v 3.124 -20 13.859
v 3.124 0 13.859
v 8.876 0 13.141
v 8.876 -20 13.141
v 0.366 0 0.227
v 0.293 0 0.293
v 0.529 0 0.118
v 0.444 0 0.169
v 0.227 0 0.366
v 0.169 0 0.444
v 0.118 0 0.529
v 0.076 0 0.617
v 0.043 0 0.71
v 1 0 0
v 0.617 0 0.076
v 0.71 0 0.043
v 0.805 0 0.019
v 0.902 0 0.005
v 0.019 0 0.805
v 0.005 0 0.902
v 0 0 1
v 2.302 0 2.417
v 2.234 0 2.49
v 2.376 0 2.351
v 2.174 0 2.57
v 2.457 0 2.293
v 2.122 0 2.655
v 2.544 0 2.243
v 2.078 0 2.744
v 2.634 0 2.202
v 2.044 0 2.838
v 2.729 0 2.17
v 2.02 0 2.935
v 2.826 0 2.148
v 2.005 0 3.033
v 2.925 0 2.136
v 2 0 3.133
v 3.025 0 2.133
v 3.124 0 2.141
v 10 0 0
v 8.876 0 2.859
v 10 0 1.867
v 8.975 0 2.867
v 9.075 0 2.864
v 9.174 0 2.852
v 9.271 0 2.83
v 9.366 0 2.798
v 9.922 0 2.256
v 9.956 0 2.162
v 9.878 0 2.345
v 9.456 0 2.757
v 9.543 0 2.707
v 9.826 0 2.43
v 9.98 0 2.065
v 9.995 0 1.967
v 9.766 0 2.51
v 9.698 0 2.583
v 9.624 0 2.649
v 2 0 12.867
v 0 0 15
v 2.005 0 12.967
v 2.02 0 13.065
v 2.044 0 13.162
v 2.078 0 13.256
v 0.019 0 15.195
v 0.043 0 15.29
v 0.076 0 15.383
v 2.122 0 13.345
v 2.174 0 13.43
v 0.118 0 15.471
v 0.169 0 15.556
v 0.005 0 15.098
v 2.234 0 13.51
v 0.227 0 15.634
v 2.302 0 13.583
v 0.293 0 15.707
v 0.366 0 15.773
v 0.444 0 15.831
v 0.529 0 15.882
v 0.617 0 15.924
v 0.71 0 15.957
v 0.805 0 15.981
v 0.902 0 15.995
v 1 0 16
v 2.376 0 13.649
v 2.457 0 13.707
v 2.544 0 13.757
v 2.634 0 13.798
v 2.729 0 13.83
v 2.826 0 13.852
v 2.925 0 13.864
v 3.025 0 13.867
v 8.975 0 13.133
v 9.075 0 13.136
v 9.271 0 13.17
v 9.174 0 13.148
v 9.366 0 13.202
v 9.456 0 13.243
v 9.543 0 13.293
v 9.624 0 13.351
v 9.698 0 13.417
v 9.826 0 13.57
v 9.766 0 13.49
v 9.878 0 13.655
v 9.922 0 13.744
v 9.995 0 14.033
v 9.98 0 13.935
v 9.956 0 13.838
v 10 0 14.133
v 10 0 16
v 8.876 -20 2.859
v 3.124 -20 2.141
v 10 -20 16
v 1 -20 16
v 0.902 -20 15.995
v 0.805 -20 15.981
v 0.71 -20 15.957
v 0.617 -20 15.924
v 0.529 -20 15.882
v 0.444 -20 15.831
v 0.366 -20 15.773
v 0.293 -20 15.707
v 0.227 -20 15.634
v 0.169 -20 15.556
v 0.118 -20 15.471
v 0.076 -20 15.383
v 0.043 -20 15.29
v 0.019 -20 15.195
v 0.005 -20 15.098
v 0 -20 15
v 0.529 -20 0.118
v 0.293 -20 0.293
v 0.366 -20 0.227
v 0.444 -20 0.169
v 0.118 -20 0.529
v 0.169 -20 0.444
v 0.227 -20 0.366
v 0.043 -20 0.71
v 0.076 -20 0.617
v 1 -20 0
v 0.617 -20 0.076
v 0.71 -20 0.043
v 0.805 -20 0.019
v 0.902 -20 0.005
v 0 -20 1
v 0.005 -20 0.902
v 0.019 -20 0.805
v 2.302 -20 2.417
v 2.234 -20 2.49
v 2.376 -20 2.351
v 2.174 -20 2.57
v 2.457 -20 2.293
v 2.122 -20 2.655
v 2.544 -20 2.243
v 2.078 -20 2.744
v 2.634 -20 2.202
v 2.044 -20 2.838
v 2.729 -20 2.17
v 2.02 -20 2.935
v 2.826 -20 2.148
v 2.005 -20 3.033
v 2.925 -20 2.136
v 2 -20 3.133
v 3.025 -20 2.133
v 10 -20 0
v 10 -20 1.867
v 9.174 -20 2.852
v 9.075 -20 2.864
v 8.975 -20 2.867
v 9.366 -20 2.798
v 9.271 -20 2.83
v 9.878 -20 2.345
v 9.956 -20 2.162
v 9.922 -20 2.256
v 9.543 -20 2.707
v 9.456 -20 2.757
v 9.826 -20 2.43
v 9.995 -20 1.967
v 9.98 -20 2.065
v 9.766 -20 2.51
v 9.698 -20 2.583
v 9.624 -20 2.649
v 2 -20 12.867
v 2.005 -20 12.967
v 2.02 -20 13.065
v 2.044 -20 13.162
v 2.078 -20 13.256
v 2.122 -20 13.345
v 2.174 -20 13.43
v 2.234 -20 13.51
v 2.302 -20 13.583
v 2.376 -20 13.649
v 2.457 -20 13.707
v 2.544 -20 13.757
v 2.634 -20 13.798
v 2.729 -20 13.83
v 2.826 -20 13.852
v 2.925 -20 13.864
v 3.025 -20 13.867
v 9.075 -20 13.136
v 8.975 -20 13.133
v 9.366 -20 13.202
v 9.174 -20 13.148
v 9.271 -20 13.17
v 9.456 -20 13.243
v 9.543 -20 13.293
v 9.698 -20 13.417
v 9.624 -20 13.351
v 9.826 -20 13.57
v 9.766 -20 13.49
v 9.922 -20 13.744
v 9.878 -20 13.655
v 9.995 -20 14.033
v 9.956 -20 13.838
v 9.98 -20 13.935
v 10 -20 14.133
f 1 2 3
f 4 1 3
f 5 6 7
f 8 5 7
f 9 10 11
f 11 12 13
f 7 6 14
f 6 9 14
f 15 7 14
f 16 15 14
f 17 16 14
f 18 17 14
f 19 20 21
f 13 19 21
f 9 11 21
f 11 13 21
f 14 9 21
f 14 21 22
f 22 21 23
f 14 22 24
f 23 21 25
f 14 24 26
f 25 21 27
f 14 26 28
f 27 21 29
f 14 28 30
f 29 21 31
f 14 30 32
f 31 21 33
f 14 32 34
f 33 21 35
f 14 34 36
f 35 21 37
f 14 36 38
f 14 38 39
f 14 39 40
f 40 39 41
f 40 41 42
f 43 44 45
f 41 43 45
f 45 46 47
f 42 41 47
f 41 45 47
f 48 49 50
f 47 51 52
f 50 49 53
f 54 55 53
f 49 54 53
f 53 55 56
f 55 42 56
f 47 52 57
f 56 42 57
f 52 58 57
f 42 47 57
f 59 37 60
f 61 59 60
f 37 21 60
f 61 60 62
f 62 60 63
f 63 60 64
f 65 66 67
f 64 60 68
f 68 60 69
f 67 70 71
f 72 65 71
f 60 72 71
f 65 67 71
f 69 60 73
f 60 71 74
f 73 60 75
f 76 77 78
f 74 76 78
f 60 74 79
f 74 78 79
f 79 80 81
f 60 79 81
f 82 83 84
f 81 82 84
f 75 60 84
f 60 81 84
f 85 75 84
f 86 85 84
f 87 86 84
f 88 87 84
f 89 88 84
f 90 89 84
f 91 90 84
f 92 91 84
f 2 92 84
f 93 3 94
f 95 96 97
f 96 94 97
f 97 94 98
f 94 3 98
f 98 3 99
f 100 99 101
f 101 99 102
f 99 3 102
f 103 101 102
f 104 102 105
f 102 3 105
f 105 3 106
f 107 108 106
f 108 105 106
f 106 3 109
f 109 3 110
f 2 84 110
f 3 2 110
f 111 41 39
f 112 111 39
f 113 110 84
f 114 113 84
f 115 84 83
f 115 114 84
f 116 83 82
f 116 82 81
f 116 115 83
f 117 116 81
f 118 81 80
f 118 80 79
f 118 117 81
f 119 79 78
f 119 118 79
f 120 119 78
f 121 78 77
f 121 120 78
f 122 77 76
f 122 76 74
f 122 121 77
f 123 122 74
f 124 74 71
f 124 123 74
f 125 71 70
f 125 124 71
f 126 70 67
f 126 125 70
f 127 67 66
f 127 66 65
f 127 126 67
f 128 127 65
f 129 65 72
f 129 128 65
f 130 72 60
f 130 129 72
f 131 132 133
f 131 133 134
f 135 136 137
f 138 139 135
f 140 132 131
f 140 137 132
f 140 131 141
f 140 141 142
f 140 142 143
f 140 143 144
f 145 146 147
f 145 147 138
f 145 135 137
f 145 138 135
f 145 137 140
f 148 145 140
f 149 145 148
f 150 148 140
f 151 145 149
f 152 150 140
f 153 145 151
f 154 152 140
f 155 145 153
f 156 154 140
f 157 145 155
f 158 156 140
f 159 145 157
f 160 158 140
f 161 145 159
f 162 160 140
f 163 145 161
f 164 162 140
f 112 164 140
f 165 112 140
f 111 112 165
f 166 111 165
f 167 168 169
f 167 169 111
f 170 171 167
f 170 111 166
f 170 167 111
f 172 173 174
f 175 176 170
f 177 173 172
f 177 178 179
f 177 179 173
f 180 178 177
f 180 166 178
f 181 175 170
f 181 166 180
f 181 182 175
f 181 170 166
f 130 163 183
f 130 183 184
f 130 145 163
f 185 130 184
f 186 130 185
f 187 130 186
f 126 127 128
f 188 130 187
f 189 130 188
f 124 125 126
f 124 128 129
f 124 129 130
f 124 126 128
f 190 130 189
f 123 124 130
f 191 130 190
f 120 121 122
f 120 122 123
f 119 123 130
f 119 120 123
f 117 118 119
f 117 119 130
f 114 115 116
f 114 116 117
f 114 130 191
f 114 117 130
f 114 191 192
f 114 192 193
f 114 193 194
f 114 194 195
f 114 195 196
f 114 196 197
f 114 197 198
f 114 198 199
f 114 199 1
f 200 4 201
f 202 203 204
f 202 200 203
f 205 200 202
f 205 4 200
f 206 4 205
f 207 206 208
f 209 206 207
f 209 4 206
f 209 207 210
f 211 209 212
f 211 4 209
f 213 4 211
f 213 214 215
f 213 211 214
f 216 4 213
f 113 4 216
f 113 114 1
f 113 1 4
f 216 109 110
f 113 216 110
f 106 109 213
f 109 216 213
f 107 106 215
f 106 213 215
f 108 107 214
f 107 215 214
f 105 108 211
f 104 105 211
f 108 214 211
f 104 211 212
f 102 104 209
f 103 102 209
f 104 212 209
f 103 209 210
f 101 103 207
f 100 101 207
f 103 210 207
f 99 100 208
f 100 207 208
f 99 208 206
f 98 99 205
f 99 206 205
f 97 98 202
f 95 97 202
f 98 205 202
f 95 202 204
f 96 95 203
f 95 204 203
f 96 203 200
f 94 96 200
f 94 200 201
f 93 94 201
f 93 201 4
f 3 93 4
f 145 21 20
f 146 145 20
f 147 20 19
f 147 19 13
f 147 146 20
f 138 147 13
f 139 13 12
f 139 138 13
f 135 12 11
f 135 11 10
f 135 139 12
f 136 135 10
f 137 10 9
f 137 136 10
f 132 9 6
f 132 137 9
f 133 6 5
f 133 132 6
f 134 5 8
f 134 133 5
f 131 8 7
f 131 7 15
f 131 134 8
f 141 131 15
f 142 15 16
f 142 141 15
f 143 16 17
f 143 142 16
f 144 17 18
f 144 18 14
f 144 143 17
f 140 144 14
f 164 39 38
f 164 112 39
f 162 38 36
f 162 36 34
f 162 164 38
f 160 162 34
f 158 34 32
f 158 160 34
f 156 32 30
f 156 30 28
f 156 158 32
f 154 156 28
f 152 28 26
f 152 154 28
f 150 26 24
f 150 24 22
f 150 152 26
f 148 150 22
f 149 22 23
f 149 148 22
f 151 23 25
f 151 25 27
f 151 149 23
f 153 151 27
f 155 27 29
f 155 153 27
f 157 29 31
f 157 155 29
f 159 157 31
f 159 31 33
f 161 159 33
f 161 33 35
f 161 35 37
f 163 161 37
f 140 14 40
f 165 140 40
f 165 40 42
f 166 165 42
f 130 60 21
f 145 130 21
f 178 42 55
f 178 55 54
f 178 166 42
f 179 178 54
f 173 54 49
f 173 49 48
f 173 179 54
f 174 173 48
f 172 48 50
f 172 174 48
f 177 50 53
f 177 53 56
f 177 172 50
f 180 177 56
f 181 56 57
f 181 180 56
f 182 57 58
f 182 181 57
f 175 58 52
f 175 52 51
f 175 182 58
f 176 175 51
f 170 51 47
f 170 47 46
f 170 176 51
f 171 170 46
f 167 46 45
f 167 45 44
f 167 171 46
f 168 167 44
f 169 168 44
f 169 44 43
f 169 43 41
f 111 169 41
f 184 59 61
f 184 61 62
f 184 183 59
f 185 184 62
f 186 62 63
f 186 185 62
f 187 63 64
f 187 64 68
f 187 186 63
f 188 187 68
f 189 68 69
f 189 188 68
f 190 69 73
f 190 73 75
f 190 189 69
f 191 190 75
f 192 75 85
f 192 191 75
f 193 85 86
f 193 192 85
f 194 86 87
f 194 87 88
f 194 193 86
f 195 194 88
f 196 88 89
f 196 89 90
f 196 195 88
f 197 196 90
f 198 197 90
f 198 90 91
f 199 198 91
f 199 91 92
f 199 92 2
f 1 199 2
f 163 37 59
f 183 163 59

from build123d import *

# Parameters (mm, degrees)
F1_DEPTH = 20
F2_R     = 1
F3_R     = 1


with BuildPart() as f1:
    # F0 (on Front) → F1 (new body)
    with BuildSketch(Plane.XZ):
        Polygon((10, 13), (10, 16), (0, 16), (0, 0), (10, 0), (10, 3), (2, 2), (2, 14), align=None)
    extrude(amount=F1_DEPTH)

    # F2
    f2_edges = [f1.edges().sort_by_distance(p)[0] for p in [
        (10, -10, 13),
        (10, -10, 3),
        (2, -10, 14),
        (2, -10, 2),
    ]]
    fillet(f2_edges, radius=F2_R)

    # F3
    f3_edges = [f1.edges().sort_by_distance(p)[0] for p in [
        (0, -10, 0),
        (0, -10, 16),
    ]]
    fillet(f3_edges, radius=F3_R)


solid = f1.part
